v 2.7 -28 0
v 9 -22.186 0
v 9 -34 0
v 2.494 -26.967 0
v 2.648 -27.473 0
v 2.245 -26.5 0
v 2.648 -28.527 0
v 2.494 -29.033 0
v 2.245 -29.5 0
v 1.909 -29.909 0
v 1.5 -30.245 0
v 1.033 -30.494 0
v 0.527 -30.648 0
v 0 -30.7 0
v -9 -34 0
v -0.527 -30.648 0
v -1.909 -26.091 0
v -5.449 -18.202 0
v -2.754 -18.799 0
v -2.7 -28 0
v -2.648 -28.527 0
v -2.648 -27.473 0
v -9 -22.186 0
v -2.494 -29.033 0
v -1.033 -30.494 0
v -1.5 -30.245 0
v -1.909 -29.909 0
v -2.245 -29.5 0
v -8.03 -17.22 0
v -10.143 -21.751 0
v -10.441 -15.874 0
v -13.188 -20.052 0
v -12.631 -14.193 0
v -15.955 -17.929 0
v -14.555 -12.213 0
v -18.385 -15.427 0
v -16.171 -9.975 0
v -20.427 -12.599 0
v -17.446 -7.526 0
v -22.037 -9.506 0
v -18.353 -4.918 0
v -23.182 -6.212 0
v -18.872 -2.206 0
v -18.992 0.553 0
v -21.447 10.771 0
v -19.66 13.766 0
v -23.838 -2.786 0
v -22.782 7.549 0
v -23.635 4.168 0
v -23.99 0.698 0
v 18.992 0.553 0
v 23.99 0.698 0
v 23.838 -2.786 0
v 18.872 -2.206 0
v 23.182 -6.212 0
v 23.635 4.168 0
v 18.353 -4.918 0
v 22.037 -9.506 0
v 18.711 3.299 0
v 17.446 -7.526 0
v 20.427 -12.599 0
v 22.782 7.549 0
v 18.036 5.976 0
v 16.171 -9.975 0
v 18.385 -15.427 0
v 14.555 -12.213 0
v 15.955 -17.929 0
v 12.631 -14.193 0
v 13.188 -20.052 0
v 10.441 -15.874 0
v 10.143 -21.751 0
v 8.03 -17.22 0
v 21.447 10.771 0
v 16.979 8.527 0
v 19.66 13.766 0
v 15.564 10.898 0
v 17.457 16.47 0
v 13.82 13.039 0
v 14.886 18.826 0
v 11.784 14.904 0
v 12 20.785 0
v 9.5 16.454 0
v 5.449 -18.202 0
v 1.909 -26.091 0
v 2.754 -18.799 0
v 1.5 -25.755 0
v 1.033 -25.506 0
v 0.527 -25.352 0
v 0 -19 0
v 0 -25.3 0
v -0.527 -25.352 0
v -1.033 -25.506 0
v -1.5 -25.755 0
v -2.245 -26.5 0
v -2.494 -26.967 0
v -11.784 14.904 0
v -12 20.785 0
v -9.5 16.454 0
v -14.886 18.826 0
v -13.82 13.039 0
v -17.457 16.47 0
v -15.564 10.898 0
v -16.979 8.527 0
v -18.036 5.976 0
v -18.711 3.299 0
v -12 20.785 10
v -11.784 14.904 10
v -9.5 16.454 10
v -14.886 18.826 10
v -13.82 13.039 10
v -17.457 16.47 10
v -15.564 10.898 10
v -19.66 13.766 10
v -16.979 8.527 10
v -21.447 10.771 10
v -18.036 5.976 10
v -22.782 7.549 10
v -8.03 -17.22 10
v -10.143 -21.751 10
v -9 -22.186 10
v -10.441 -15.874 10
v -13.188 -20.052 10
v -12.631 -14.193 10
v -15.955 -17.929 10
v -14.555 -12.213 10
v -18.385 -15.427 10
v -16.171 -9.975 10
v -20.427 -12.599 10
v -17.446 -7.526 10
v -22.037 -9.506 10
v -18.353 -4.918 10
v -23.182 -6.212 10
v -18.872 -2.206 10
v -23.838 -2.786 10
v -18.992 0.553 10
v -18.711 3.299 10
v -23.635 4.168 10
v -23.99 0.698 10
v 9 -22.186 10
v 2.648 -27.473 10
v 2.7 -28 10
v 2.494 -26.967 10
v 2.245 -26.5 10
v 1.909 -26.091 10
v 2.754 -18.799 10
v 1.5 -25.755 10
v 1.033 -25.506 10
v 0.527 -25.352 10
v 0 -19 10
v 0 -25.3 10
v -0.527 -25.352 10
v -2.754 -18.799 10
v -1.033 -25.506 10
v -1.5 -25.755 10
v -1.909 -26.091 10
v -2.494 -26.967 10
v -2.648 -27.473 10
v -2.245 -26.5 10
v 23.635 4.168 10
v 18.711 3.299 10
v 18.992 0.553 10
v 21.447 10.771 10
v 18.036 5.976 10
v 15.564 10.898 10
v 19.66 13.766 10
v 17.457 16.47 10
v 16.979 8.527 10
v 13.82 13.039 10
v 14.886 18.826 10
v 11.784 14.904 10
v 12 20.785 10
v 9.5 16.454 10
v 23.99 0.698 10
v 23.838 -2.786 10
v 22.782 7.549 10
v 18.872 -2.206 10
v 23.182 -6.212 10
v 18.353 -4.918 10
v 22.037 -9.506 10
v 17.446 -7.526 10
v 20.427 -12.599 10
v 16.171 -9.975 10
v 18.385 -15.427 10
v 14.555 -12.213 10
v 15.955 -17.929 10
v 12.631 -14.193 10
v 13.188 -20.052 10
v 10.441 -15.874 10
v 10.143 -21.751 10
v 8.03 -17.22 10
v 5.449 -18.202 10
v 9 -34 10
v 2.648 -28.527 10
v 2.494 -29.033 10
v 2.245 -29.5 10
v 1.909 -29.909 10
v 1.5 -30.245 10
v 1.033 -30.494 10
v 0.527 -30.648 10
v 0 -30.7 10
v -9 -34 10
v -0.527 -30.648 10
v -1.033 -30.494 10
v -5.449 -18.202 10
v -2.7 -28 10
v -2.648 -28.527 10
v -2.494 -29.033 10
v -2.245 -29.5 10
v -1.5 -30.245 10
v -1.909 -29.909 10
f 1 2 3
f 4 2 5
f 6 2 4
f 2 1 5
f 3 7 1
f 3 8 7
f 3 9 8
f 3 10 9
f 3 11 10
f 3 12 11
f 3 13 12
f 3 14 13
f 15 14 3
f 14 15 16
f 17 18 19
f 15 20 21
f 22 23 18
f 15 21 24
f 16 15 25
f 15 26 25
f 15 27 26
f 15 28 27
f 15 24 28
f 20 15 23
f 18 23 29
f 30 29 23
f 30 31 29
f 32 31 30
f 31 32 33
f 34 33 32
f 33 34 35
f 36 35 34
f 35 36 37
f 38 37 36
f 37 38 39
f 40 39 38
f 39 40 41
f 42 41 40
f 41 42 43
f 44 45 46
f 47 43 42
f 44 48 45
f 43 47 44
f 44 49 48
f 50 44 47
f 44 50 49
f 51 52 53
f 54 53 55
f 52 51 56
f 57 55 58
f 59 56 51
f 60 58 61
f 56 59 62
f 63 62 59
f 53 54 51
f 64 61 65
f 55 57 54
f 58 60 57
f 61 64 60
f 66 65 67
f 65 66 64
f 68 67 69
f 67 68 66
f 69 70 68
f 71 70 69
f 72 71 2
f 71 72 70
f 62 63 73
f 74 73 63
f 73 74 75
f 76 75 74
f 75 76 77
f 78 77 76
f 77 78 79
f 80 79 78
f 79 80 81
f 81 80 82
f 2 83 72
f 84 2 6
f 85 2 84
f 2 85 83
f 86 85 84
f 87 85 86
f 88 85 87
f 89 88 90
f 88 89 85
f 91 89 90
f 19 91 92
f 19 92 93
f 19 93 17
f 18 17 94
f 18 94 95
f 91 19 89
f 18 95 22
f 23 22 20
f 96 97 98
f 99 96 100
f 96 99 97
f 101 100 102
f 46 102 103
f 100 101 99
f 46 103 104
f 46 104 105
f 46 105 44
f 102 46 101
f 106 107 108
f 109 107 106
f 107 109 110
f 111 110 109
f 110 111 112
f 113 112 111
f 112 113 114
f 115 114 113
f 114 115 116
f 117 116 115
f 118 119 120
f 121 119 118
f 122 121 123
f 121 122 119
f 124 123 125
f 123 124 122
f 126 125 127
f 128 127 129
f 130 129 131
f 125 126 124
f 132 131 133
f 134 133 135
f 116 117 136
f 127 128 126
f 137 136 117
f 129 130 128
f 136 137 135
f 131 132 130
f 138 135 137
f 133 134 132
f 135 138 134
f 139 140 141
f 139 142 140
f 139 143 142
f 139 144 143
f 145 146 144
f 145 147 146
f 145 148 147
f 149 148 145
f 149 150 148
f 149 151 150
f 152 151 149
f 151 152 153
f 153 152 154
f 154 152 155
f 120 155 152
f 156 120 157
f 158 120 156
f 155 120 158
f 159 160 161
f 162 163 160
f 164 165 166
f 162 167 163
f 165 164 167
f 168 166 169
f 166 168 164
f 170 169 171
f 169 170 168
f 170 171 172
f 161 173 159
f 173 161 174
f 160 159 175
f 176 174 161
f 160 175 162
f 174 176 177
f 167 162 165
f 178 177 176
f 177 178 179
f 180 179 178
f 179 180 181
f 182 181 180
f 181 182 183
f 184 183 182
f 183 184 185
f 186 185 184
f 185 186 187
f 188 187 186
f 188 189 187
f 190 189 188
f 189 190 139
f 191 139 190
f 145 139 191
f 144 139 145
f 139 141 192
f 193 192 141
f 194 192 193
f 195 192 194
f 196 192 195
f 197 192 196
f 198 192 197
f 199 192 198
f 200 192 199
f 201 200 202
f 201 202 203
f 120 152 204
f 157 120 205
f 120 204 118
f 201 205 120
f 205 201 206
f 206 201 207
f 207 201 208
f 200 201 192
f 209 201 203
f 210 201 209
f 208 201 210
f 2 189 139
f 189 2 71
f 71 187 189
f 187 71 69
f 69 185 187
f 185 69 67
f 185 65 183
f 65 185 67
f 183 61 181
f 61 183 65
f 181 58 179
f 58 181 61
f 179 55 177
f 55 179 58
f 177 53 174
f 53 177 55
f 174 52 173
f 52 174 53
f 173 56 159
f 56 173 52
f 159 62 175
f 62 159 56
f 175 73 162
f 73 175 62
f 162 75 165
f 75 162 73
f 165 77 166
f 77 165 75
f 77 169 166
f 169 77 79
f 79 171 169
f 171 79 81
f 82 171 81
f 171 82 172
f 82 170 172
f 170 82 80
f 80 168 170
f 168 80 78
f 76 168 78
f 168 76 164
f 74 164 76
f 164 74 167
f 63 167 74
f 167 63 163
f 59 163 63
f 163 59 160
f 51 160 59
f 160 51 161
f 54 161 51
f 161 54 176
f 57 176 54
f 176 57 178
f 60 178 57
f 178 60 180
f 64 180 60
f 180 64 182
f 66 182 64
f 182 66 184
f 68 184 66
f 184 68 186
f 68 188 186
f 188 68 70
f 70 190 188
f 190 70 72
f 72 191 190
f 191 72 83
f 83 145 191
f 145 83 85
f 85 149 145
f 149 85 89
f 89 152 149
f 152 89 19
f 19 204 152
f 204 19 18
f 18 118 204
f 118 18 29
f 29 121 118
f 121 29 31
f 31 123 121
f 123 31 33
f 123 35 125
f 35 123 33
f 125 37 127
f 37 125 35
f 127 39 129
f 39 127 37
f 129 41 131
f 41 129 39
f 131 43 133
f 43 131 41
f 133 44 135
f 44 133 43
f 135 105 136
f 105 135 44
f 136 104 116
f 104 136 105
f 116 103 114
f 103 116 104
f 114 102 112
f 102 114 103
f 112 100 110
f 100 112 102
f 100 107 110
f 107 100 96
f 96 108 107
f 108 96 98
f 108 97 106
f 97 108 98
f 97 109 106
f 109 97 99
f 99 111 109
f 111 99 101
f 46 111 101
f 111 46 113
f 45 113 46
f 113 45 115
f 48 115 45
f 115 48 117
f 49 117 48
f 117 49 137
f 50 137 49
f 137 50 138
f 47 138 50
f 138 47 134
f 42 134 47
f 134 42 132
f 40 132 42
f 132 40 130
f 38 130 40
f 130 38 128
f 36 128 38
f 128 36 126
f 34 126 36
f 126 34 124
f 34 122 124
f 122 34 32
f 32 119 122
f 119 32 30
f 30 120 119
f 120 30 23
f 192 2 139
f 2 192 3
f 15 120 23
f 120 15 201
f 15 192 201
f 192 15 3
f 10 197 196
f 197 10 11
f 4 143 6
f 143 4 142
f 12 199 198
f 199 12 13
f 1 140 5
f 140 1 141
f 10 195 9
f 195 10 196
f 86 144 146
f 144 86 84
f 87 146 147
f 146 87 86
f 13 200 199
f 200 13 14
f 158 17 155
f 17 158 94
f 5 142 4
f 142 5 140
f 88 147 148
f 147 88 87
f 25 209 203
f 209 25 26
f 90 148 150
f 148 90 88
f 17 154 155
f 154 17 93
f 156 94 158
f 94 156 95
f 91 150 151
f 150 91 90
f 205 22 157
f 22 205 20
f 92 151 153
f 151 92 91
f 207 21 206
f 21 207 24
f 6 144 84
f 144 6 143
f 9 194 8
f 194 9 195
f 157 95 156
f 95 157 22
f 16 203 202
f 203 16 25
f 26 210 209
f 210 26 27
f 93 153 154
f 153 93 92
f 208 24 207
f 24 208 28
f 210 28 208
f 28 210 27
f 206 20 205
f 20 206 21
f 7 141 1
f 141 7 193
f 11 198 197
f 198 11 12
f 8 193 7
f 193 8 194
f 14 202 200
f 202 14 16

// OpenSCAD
$fn = 32;

// ----------------------------------------------------------------------
// Spring clip: 48 mm outside, 5 mm band, 60 degree opening
// ----------------------------------------------------------------------

// --- parameters (mm) ---
outer_r = 24;             // clip outside radius
inner_r = 19;             // clip bore radius
band = 5;                 // band thickness
clip_w = 10;              // clip width
opening = 60;             // opening angle
tab_w = 18;               // tab width
tab_len = 10;             // tab length past the clip
tab_hole = 5.4;           // tab fixing hole

clip_profile = [[-12, 20.785], [-14.886, 18.826], [-17.457, 16.47], [-19.66, 13.766], [-21.447, 10.771], [-22.782, 7.549], [-23.635, 4.168], [-23.99, 0.698], [-23.838, -2.786], [-23.182, -6.212], [-22.037, -9.506], [-20.427, -12.599], [-18.385, -15.427], [-15.955, -17.929], [-13.188, -20.052], [-10.143, -21.751], [-6.883, -22.992], [-3.478, -23.747], [0, -24], [3.478, -23.747], [6.883, -22.992], [10.143, -21.751], [13.188, -20.052], [15.955, -17.929], [18.385, -15.427], [20.427, -12.599], [22.037, -9.506], [23.182, -6.212], [23.838, -2.786], [23.99, 0.698], [23.635, 4.168], [22.782, 7.549], [21.447, 10.771], [19.66, 13.766], [17.457, 16.47], [14.886, 18.826], [12, 20.785], [9.5, 16.454], [11.784, 14.904], [13.82, 13.039], [15.564, 10.898], [16.979, 8.527], [18.036, 5.976], [18.711, 3.299], [18.992, 0.553], [18.872, -2.206], [18.353, -4.918], [17.446, -7.526], [16.171, -9.975], [14.555, -12.213], [12.631, -14.193], [10.441, -15.874], [8.03, -17.22], [5.449, -18.202], [2.754, -18.799], [0, -19], [-2.754, -18.799], [-5.449, -18.202], [-8.03, -17.22], [-10.441, -15.874], [-12.631, -14.193], [-14.555, -12.213], [-16.171, -9.975], [-17.446, -7.526], [-18.353, -4.918], [-18.872, -2.206], [-18.992, 0.553], [-18.711, 3.299], [-18.036, 5.976], [-16.979, 8.527], [-15.564, 10.898], [-13.82, 13.039], [-11.784, 14.904], [-9.5, 16.454]];

difference() {
  union() {
    linear_extrude(height = clip_w) polygon(clip_profile);
    /* mounting tab, sunk 2 mm into the band */
    translate([-9, -34, 0]) cube([tab_w, 12, clip_w]);
  }
  translate([0, -28, -2.5]) cylinder(h = clip_w + 5, d = tab_hole);
}
